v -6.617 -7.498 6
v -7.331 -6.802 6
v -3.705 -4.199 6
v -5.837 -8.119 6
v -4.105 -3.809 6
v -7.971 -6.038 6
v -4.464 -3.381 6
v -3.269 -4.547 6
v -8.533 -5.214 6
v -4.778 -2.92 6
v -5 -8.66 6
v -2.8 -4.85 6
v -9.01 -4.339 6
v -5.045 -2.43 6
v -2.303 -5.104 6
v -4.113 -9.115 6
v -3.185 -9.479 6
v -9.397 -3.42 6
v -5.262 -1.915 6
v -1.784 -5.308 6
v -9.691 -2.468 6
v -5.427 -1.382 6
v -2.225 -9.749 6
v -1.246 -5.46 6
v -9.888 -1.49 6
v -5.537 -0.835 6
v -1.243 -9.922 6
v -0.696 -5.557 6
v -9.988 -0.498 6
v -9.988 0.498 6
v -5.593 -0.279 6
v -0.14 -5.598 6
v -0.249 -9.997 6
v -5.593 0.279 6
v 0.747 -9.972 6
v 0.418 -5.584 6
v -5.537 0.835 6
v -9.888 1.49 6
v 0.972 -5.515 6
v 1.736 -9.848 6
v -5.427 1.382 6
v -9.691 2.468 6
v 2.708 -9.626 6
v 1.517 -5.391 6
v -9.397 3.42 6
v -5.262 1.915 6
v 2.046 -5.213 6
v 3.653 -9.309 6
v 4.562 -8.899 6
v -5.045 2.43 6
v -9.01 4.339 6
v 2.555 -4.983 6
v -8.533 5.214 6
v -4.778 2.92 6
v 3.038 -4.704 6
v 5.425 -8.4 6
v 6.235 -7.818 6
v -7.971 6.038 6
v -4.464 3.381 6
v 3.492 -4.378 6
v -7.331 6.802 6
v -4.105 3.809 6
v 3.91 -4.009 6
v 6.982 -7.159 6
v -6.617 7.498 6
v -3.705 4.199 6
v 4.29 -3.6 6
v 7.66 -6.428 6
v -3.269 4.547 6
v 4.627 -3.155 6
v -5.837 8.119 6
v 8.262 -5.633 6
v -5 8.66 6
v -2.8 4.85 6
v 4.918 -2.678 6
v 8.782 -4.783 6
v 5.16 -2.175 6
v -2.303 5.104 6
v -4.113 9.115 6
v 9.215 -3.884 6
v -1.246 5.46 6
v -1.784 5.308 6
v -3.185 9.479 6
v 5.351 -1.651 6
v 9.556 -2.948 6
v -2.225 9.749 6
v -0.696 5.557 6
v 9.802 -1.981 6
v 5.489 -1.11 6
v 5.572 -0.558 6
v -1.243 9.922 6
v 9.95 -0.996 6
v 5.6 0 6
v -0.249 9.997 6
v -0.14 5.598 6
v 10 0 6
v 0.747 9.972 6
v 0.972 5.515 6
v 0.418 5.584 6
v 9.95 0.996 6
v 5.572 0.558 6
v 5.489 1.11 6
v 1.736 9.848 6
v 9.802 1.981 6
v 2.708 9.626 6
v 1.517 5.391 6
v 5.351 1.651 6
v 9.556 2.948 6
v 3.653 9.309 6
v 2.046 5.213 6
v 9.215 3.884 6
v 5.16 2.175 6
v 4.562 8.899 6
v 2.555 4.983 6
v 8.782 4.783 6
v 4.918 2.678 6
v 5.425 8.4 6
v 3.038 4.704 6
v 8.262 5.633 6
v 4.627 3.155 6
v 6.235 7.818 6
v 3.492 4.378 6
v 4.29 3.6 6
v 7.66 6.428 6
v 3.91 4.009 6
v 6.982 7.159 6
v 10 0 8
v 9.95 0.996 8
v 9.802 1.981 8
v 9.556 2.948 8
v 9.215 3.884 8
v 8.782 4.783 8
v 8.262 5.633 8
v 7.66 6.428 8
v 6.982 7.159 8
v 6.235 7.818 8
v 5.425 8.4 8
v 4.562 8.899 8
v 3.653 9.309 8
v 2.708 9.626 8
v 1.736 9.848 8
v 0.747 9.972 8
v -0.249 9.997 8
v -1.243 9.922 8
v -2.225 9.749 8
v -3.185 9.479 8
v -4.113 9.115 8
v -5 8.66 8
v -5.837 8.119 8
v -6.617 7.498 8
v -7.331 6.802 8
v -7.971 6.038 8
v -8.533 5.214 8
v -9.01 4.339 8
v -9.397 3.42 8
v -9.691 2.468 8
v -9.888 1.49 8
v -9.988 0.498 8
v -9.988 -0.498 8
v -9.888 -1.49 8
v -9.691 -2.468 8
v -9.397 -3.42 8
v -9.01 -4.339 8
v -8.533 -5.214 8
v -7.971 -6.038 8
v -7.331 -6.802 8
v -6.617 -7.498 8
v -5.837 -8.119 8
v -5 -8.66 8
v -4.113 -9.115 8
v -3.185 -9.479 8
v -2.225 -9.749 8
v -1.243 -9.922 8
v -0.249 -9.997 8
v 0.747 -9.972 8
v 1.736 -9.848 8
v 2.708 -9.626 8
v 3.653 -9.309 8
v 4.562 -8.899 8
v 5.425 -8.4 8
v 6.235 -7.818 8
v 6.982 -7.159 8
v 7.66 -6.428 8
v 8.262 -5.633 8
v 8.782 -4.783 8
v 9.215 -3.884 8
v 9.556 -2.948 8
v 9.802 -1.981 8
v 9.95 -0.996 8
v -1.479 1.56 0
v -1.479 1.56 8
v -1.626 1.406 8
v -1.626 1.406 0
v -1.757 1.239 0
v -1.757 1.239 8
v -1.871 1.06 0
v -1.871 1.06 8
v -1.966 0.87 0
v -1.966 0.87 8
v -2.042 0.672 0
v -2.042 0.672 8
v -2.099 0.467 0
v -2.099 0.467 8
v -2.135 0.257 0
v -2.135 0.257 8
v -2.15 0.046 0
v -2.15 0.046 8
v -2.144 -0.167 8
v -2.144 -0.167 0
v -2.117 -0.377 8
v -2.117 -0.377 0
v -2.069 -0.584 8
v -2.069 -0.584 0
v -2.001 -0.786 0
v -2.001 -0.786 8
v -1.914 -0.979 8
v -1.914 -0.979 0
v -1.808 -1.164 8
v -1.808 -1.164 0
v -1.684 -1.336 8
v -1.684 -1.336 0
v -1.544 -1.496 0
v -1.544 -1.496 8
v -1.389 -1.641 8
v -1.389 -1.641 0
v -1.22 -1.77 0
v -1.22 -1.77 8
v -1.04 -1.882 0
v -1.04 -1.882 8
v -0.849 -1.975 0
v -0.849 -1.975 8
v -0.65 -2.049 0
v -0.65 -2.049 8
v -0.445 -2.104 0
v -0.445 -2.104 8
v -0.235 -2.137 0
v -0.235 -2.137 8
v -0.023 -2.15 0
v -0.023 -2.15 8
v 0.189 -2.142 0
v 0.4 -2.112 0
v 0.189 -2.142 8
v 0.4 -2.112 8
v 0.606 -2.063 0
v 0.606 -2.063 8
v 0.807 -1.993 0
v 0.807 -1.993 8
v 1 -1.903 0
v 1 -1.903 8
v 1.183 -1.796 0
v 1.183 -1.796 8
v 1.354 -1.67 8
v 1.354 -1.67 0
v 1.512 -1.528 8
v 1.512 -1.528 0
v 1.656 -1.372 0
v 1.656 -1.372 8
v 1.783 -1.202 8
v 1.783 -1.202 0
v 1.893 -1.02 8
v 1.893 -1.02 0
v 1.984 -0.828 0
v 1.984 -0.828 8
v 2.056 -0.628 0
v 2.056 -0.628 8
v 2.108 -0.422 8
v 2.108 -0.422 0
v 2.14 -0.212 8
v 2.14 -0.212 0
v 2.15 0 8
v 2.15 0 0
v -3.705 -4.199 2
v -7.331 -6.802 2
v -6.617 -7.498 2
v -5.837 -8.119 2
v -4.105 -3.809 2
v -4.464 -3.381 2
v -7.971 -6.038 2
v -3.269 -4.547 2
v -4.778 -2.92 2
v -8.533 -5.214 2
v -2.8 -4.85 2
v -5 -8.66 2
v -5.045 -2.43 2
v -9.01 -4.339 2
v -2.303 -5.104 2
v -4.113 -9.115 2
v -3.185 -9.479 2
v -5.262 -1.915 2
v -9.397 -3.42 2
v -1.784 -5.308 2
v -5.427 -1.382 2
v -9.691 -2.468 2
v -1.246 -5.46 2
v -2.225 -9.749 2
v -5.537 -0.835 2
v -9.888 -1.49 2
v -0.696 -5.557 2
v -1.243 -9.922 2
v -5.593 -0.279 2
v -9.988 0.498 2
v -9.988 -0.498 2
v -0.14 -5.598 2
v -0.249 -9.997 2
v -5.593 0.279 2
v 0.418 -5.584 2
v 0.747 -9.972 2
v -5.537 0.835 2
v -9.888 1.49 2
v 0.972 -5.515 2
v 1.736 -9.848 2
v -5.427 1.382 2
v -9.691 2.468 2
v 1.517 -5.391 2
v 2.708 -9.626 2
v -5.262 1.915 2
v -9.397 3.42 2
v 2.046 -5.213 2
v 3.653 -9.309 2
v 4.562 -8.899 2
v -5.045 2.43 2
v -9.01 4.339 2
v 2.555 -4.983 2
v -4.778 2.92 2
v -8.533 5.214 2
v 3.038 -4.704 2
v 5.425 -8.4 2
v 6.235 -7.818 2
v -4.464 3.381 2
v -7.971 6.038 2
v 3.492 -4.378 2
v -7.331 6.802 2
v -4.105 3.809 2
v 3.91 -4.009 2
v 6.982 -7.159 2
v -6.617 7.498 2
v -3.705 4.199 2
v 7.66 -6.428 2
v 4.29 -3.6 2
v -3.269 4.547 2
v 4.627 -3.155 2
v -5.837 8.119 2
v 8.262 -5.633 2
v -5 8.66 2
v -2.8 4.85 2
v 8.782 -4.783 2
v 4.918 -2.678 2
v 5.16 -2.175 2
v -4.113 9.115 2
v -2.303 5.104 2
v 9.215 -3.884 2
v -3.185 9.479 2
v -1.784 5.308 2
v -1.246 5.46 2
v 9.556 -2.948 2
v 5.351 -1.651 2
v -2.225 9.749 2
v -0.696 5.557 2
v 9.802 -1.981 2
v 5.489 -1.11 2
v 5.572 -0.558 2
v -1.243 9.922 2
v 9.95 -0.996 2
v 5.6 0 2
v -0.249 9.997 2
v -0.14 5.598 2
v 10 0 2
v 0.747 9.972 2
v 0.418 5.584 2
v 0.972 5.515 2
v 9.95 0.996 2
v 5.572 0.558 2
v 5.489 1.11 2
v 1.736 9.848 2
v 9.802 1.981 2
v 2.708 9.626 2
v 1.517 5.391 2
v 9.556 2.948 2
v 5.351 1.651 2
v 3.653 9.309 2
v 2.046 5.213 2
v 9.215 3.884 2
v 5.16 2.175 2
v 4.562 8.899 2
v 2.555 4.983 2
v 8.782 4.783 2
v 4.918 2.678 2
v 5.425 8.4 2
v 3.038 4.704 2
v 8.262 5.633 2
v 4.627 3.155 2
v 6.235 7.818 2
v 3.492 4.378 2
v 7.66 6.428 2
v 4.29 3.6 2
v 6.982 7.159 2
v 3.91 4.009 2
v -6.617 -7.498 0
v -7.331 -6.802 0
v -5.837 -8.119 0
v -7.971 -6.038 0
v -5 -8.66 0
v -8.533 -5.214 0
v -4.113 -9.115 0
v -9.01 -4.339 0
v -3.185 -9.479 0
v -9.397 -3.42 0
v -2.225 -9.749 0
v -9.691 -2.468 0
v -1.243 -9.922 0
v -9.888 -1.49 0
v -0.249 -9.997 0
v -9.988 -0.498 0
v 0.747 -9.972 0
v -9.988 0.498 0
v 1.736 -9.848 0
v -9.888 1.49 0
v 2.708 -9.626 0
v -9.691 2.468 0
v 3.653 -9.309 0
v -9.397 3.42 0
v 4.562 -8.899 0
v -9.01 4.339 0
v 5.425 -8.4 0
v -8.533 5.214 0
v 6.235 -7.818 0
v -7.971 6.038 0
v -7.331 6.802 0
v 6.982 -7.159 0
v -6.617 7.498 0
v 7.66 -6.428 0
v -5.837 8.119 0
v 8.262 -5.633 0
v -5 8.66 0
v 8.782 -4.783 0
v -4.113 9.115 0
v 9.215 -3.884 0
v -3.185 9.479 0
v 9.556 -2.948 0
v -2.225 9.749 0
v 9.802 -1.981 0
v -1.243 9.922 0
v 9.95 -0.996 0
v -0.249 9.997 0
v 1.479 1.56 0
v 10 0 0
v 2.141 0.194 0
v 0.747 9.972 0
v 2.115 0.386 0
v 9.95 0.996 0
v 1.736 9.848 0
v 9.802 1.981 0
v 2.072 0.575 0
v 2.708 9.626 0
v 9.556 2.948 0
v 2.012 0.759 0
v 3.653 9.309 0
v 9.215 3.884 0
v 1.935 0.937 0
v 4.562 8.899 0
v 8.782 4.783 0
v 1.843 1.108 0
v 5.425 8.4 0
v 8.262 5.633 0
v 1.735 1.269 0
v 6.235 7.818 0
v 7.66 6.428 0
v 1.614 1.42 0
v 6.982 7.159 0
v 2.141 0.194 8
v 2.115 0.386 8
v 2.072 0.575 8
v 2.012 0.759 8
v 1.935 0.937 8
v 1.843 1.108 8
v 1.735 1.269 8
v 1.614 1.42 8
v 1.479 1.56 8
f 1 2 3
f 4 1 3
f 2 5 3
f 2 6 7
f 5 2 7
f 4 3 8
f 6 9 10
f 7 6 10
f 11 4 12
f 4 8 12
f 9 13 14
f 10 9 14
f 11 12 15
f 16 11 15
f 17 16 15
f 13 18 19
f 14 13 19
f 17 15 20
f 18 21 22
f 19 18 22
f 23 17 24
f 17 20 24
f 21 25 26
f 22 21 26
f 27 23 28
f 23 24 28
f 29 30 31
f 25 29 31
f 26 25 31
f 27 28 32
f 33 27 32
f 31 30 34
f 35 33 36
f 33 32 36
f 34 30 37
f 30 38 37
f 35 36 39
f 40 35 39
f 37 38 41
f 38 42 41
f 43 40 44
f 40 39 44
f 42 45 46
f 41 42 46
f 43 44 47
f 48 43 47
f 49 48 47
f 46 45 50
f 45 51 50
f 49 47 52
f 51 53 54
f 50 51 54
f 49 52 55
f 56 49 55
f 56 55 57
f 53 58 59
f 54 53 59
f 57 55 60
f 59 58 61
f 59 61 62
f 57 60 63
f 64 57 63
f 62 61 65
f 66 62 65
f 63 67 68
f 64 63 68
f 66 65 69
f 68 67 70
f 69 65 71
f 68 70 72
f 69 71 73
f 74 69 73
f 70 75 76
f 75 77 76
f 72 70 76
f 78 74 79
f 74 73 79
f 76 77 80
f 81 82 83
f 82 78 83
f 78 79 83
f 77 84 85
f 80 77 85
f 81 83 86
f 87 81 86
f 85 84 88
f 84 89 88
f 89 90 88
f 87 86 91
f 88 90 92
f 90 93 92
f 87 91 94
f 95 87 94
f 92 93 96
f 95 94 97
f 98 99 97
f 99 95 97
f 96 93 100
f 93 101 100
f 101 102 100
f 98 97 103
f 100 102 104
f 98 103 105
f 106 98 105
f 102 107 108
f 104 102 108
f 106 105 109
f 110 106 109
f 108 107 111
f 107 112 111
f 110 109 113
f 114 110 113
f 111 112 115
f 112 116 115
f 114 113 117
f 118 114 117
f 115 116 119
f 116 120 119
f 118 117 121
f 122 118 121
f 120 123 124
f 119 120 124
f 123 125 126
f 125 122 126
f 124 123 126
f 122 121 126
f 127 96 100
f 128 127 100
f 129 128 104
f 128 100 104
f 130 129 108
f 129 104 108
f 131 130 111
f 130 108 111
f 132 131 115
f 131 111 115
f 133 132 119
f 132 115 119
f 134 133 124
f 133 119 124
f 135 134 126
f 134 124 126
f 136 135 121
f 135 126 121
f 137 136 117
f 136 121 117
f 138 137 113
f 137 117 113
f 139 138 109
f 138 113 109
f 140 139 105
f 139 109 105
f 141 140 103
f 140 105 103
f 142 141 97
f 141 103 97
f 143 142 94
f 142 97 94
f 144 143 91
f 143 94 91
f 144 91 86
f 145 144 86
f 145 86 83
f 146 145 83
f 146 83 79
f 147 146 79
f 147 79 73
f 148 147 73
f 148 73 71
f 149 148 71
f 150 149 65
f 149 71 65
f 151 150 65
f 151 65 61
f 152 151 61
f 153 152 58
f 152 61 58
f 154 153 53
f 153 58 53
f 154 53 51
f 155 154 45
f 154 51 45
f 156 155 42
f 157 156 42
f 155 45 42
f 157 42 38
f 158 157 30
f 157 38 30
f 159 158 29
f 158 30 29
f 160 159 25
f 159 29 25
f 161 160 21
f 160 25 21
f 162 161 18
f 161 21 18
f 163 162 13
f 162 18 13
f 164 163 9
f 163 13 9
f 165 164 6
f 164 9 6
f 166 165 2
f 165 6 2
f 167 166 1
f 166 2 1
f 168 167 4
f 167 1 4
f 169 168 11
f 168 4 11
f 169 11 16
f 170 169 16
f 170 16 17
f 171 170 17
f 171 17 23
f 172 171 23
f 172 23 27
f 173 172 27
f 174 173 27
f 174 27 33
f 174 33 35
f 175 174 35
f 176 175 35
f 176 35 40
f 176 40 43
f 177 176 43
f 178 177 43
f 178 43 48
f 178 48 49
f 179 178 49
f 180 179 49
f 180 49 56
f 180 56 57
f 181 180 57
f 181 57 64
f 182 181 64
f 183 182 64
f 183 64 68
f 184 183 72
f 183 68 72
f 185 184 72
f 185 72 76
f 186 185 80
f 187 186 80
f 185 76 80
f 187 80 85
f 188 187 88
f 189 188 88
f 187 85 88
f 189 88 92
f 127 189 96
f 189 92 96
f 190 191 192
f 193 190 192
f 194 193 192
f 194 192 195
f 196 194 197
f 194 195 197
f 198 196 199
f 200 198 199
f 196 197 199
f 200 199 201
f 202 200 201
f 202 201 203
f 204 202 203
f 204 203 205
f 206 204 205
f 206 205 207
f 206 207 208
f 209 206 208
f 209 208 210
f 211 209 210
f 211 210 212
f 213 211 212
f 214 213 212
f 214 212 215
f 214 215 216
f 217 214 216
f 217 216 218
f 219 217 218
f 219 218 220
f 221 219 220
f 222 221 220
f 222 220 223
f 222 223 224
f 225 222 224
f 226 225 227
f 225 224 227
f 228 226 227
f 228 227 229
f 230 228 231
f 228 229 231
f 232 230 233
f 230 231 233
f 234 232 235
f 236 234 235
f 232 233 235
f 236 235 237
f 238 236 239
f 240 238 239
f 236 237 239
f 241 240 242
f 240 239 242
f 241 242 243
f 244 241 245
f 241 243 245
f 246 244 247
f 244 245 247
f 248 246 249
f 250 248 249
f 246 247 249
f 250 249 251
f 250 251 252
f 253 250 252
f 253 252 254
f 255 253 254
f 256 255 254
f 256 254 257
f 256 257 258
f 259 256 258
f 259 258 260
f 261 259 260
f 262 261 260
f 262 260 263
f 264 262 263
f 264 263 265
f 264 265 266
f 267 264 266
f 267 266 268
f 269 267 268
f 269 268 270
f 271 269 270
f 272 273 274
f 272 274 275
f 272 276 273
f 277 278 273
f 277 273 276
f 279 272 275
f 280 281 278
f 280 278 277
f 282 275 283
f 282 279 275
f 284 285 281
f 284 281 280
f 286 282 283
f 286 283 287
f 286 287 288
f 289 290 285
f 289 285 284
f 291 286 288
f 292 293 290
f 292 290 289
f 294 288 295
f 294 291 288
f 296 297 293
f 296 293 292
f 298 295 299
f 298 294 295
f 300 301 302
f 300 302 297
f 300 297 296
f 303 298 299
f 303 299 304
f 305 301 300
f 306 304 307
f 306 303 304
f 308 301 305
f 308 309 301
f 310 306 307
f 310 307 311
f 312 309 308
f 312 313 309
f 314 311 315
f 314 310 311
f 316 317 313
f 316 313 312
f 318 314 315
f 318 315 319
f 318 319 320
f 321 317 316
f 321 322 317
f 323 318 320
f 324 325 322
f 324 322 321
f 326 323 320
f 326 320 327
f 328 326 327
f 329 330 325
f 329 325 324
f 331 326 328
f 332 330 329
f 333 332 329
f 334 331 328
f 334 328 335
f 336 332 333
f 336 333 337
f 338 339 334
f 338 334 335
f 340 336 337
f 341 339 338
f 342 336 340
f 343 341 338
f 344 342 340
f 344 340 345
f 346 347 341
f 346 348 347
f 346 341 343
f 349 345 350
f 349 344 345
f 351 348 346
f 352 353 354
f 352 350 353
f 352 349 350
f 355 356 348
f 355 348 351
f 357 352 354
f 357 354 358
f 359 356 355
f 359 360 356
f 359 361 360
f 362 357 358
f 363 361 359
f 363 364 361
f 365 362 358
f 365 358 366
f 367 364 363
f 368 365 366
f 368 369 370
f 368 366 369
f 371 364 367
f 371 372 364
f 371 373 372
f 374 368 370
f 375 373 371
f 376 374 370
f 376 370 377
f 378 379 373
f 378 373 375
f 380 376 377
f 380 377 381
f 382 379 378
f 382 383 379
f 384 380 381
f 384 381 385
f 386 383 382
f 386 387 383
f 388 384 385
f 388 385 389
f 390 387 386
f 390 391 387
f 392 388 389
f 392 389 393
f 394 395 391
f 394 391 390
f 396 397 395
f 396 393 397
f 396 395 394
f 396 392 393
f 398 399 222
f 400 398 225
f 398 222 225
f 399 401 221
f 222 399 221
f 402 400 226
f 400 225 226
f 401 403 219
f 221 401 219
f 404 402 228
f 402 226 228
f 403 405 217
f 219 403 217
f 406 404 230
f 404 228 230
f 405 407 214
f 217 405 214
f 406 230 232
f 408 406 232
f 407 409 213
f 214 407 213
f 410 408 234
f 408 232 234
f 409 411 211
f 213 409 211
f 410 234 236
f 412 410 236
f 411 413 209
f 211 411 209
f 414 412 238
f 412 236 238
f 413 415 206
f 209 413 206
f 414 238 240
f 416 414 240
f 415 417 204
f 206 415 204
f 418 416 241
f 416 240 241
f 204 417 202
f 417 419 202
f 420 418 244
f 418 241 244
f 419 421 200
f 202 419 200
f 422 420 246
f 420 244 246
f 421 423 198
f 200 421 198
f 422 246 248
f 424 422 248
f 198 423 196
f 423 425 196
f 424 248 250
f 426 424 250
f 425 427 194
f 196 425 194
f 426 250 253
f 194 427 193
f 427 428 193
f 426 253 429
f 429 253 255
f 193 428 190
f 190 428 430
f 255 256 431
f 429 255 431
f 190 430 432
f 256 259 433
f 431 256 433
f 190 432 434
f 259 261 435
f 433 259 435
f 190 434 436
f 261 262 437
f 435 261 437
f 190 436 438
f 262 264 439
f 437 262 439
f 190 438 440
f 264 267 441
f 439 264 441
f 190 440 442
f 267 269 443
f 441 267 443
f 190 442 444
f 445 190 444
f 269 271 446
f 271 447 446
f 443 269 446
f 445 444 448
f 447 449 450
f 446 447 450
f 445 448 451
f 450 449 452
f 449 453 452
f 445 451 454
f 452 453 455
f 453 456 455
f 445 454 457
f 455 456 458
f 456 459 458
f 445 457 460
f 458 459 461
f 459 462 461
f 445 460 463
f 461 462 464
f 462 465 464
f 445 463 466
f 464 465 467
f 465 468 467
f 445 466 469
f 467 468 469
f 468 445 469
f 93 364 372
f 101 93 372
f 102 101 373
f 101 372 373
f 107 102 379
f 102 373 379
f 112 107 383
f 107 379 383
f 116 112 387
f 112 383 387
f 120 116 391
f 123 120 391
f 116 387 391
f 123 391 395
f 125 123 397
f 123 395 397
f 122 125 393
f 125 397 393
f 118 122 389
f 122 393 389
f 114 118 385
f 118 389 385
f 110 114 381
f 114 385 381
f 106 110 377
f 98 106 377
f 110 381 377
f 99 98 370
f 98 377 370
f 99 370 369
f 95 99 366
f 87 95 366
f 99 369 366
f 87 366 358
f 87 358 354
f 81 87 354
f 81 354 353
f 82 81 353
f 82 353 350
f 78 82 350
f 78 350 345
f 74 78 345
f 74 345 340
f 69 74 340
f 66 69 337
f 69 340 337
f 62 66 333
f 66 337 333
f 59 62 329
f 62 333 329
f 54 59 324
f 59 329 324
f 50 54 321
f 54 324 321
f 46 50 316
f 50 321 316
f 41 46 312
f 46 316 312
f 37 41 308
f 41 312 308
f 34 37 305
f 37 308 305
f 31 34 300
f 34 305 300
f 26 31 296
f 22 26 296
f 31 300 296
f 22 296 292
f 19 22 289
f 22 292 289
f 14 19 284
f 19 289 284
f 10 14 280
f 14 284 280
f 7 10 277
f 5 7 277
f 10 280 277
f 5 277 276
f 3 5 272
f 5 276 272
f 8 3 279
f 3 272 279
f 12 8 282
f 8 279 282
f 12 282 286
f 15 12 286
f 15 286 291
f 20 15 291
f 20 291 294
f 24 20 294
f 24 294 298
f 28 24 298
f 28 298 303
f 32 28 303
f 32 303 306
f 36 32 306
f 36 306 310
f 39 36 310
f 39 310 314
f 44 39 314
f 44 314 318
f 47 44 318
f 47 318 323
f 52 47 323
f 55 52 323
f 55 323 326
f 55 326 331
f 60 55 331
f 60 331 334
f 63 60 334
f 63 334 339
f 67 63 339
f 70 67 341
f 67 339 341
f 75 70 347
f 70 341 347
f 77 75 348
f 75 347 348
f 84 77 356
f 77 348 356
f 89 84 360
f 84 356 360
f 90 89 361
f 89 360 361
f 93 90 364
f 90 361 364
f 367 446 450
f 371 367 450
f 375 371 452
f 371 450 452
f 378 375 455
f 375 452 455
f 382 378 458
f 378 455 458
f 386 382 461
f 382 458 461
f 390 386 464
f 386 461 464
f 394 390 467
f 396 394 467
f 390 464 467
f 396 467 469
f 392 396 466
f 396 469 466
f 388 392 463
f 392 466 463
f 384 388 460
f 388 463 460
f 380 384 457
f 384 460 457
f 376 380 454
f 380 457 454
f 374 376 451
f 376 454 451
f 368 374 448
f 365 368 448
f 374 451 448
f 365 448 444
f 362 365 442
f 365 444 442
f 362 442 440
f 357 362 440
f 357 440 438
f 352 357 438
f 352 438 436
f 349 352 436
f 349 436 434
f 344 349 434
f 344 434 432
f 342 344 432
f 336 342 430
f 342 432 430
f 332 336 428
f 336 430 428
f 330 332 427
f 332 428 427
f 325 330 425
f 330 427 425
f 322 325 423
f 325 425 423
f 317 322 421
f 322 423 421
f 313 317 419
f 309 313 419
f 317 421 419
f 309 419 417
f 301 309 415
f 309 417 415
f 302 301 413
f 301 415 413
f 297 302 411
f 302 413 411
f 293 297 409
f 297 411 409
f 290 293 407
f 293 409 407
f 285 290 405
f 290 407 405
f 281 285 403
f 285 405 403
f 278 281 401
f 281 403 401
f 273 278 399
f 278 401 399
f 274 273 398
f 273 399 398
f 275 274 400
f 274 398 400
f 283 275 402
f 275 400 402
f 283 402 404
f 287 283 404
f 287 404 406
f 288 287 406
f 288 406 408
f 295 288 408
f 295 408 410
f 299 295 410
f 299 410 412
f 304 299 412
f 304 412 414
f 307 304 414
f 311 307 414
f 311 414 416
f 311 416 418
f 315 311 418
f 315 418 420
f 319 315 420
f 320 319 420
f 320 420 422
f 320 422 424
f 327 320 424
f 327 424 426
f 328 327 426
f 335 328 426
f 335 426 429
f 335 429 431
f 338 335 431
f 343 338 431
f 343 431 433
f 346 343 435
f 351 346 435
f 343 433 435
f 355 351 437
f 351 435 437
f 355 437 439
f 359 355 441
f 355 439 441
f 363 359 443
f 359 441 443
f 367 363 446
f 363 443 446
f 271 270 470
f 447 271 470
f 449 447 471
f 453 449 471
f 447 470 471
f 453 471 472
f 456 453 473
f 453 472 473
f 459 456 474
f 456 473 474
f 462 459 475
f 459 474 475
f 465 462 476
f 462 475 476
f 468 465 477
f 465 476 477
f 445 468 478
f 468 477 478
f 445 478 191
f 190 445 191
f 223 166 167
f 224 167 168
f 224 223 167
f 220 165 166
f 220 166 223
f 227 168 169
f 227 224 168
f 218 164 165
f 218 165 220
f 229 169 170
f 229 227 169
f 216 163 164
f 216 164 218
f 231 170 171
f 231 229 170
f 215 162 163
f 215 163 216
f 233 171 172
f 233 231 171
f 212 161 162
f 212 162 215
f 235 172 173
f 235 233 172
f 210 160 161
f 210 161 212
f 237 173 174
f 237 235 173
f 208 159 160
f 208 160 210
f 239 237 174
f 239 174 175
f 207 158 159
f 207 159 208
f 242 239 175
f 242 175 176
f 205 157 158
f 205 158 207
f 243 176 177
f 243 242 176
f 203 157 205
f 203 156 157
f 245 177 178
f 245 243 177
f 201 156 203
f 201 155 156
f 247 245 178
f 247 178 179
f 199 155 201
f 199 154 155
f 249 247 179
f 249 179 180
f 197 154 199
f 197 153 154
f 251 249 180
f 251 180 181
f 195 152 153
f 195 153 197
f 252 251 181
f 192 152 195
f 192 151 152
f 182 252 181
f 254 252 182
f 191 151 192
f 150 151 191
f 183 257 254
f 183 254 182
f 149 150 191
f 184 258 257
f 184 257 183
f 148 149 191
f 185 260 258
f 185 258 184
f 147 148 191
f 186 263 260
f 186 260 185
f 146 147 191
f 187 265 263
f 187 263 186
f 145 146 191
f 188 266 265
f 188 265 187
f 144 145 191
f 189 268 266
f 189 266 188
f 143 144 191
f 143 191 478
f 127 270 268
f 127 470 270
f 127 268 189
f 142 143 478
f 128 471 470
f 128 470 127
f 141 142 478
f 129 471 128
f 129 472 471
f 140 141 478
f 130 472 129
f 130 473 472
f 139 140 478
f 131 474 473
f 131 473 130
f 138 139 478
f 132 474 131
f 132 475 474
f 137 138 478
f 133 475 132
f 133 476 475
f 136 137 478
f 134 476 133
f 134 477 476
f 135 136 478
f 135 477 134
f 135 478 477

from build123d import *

# Parameters (mm, degrees)
SKETCH1_R           = 10
BOSS_EXTRUDE1_DEPTH = 2
SKETCH2_R           = 5.6
BOSS_EXTRUDE2_DEPTH = 4
SKETCH3_R           = 10
BOSS_EXTRUDE3_DEPTH = 2
CUT_EXTRUDE1_DEPTH  = 17.248076809


with BuildPart() as part:
    # Sketch1 → Boss-Extrude1 (new body)
    with BuildSketch(Plane.XY):
        Circle(SKETCH1_R)
    extrude(amount=BOSS_EXTRUDE1_DEPTH)

    # Sketch2 → Boss-Extrude2 (add)
    with BuildSketch(Plane.XY.offset(2)):
        Circle(SKETCH2_R)
    extrude(amount=BOSS_EXTRUDE2_DEPTH)

    # Sketch3 → Boss-Extrude3 (add)
    with BuildSketch(Plane.XY.offset(6)):
        Circle(SKETCH3_R)
    extrude(amount=BOSS_EXTRUDE3_DEPTH)

    # Sketch6 → Cut-Extrude1 (cut, through all)
    with BuildSketch(Plane.XY.offset(8)):
        with BuildLine():
            Line((1.479493156, 1.56), (-1.479493156, 1.56))
            ThreePointArc((-1.479493156, 1.56), (-0.848996382, -1.975273435), (2.15, 0))
            ThreePointArc((2.15, 0), (1.975273435, 0.848996382), (1.479493156, 1.56))
        make_face()
    extrude(amount=-CUT_EXTRUDE1_DEPTH, mode=Mode.SUBTRACT)


solid = part.part
